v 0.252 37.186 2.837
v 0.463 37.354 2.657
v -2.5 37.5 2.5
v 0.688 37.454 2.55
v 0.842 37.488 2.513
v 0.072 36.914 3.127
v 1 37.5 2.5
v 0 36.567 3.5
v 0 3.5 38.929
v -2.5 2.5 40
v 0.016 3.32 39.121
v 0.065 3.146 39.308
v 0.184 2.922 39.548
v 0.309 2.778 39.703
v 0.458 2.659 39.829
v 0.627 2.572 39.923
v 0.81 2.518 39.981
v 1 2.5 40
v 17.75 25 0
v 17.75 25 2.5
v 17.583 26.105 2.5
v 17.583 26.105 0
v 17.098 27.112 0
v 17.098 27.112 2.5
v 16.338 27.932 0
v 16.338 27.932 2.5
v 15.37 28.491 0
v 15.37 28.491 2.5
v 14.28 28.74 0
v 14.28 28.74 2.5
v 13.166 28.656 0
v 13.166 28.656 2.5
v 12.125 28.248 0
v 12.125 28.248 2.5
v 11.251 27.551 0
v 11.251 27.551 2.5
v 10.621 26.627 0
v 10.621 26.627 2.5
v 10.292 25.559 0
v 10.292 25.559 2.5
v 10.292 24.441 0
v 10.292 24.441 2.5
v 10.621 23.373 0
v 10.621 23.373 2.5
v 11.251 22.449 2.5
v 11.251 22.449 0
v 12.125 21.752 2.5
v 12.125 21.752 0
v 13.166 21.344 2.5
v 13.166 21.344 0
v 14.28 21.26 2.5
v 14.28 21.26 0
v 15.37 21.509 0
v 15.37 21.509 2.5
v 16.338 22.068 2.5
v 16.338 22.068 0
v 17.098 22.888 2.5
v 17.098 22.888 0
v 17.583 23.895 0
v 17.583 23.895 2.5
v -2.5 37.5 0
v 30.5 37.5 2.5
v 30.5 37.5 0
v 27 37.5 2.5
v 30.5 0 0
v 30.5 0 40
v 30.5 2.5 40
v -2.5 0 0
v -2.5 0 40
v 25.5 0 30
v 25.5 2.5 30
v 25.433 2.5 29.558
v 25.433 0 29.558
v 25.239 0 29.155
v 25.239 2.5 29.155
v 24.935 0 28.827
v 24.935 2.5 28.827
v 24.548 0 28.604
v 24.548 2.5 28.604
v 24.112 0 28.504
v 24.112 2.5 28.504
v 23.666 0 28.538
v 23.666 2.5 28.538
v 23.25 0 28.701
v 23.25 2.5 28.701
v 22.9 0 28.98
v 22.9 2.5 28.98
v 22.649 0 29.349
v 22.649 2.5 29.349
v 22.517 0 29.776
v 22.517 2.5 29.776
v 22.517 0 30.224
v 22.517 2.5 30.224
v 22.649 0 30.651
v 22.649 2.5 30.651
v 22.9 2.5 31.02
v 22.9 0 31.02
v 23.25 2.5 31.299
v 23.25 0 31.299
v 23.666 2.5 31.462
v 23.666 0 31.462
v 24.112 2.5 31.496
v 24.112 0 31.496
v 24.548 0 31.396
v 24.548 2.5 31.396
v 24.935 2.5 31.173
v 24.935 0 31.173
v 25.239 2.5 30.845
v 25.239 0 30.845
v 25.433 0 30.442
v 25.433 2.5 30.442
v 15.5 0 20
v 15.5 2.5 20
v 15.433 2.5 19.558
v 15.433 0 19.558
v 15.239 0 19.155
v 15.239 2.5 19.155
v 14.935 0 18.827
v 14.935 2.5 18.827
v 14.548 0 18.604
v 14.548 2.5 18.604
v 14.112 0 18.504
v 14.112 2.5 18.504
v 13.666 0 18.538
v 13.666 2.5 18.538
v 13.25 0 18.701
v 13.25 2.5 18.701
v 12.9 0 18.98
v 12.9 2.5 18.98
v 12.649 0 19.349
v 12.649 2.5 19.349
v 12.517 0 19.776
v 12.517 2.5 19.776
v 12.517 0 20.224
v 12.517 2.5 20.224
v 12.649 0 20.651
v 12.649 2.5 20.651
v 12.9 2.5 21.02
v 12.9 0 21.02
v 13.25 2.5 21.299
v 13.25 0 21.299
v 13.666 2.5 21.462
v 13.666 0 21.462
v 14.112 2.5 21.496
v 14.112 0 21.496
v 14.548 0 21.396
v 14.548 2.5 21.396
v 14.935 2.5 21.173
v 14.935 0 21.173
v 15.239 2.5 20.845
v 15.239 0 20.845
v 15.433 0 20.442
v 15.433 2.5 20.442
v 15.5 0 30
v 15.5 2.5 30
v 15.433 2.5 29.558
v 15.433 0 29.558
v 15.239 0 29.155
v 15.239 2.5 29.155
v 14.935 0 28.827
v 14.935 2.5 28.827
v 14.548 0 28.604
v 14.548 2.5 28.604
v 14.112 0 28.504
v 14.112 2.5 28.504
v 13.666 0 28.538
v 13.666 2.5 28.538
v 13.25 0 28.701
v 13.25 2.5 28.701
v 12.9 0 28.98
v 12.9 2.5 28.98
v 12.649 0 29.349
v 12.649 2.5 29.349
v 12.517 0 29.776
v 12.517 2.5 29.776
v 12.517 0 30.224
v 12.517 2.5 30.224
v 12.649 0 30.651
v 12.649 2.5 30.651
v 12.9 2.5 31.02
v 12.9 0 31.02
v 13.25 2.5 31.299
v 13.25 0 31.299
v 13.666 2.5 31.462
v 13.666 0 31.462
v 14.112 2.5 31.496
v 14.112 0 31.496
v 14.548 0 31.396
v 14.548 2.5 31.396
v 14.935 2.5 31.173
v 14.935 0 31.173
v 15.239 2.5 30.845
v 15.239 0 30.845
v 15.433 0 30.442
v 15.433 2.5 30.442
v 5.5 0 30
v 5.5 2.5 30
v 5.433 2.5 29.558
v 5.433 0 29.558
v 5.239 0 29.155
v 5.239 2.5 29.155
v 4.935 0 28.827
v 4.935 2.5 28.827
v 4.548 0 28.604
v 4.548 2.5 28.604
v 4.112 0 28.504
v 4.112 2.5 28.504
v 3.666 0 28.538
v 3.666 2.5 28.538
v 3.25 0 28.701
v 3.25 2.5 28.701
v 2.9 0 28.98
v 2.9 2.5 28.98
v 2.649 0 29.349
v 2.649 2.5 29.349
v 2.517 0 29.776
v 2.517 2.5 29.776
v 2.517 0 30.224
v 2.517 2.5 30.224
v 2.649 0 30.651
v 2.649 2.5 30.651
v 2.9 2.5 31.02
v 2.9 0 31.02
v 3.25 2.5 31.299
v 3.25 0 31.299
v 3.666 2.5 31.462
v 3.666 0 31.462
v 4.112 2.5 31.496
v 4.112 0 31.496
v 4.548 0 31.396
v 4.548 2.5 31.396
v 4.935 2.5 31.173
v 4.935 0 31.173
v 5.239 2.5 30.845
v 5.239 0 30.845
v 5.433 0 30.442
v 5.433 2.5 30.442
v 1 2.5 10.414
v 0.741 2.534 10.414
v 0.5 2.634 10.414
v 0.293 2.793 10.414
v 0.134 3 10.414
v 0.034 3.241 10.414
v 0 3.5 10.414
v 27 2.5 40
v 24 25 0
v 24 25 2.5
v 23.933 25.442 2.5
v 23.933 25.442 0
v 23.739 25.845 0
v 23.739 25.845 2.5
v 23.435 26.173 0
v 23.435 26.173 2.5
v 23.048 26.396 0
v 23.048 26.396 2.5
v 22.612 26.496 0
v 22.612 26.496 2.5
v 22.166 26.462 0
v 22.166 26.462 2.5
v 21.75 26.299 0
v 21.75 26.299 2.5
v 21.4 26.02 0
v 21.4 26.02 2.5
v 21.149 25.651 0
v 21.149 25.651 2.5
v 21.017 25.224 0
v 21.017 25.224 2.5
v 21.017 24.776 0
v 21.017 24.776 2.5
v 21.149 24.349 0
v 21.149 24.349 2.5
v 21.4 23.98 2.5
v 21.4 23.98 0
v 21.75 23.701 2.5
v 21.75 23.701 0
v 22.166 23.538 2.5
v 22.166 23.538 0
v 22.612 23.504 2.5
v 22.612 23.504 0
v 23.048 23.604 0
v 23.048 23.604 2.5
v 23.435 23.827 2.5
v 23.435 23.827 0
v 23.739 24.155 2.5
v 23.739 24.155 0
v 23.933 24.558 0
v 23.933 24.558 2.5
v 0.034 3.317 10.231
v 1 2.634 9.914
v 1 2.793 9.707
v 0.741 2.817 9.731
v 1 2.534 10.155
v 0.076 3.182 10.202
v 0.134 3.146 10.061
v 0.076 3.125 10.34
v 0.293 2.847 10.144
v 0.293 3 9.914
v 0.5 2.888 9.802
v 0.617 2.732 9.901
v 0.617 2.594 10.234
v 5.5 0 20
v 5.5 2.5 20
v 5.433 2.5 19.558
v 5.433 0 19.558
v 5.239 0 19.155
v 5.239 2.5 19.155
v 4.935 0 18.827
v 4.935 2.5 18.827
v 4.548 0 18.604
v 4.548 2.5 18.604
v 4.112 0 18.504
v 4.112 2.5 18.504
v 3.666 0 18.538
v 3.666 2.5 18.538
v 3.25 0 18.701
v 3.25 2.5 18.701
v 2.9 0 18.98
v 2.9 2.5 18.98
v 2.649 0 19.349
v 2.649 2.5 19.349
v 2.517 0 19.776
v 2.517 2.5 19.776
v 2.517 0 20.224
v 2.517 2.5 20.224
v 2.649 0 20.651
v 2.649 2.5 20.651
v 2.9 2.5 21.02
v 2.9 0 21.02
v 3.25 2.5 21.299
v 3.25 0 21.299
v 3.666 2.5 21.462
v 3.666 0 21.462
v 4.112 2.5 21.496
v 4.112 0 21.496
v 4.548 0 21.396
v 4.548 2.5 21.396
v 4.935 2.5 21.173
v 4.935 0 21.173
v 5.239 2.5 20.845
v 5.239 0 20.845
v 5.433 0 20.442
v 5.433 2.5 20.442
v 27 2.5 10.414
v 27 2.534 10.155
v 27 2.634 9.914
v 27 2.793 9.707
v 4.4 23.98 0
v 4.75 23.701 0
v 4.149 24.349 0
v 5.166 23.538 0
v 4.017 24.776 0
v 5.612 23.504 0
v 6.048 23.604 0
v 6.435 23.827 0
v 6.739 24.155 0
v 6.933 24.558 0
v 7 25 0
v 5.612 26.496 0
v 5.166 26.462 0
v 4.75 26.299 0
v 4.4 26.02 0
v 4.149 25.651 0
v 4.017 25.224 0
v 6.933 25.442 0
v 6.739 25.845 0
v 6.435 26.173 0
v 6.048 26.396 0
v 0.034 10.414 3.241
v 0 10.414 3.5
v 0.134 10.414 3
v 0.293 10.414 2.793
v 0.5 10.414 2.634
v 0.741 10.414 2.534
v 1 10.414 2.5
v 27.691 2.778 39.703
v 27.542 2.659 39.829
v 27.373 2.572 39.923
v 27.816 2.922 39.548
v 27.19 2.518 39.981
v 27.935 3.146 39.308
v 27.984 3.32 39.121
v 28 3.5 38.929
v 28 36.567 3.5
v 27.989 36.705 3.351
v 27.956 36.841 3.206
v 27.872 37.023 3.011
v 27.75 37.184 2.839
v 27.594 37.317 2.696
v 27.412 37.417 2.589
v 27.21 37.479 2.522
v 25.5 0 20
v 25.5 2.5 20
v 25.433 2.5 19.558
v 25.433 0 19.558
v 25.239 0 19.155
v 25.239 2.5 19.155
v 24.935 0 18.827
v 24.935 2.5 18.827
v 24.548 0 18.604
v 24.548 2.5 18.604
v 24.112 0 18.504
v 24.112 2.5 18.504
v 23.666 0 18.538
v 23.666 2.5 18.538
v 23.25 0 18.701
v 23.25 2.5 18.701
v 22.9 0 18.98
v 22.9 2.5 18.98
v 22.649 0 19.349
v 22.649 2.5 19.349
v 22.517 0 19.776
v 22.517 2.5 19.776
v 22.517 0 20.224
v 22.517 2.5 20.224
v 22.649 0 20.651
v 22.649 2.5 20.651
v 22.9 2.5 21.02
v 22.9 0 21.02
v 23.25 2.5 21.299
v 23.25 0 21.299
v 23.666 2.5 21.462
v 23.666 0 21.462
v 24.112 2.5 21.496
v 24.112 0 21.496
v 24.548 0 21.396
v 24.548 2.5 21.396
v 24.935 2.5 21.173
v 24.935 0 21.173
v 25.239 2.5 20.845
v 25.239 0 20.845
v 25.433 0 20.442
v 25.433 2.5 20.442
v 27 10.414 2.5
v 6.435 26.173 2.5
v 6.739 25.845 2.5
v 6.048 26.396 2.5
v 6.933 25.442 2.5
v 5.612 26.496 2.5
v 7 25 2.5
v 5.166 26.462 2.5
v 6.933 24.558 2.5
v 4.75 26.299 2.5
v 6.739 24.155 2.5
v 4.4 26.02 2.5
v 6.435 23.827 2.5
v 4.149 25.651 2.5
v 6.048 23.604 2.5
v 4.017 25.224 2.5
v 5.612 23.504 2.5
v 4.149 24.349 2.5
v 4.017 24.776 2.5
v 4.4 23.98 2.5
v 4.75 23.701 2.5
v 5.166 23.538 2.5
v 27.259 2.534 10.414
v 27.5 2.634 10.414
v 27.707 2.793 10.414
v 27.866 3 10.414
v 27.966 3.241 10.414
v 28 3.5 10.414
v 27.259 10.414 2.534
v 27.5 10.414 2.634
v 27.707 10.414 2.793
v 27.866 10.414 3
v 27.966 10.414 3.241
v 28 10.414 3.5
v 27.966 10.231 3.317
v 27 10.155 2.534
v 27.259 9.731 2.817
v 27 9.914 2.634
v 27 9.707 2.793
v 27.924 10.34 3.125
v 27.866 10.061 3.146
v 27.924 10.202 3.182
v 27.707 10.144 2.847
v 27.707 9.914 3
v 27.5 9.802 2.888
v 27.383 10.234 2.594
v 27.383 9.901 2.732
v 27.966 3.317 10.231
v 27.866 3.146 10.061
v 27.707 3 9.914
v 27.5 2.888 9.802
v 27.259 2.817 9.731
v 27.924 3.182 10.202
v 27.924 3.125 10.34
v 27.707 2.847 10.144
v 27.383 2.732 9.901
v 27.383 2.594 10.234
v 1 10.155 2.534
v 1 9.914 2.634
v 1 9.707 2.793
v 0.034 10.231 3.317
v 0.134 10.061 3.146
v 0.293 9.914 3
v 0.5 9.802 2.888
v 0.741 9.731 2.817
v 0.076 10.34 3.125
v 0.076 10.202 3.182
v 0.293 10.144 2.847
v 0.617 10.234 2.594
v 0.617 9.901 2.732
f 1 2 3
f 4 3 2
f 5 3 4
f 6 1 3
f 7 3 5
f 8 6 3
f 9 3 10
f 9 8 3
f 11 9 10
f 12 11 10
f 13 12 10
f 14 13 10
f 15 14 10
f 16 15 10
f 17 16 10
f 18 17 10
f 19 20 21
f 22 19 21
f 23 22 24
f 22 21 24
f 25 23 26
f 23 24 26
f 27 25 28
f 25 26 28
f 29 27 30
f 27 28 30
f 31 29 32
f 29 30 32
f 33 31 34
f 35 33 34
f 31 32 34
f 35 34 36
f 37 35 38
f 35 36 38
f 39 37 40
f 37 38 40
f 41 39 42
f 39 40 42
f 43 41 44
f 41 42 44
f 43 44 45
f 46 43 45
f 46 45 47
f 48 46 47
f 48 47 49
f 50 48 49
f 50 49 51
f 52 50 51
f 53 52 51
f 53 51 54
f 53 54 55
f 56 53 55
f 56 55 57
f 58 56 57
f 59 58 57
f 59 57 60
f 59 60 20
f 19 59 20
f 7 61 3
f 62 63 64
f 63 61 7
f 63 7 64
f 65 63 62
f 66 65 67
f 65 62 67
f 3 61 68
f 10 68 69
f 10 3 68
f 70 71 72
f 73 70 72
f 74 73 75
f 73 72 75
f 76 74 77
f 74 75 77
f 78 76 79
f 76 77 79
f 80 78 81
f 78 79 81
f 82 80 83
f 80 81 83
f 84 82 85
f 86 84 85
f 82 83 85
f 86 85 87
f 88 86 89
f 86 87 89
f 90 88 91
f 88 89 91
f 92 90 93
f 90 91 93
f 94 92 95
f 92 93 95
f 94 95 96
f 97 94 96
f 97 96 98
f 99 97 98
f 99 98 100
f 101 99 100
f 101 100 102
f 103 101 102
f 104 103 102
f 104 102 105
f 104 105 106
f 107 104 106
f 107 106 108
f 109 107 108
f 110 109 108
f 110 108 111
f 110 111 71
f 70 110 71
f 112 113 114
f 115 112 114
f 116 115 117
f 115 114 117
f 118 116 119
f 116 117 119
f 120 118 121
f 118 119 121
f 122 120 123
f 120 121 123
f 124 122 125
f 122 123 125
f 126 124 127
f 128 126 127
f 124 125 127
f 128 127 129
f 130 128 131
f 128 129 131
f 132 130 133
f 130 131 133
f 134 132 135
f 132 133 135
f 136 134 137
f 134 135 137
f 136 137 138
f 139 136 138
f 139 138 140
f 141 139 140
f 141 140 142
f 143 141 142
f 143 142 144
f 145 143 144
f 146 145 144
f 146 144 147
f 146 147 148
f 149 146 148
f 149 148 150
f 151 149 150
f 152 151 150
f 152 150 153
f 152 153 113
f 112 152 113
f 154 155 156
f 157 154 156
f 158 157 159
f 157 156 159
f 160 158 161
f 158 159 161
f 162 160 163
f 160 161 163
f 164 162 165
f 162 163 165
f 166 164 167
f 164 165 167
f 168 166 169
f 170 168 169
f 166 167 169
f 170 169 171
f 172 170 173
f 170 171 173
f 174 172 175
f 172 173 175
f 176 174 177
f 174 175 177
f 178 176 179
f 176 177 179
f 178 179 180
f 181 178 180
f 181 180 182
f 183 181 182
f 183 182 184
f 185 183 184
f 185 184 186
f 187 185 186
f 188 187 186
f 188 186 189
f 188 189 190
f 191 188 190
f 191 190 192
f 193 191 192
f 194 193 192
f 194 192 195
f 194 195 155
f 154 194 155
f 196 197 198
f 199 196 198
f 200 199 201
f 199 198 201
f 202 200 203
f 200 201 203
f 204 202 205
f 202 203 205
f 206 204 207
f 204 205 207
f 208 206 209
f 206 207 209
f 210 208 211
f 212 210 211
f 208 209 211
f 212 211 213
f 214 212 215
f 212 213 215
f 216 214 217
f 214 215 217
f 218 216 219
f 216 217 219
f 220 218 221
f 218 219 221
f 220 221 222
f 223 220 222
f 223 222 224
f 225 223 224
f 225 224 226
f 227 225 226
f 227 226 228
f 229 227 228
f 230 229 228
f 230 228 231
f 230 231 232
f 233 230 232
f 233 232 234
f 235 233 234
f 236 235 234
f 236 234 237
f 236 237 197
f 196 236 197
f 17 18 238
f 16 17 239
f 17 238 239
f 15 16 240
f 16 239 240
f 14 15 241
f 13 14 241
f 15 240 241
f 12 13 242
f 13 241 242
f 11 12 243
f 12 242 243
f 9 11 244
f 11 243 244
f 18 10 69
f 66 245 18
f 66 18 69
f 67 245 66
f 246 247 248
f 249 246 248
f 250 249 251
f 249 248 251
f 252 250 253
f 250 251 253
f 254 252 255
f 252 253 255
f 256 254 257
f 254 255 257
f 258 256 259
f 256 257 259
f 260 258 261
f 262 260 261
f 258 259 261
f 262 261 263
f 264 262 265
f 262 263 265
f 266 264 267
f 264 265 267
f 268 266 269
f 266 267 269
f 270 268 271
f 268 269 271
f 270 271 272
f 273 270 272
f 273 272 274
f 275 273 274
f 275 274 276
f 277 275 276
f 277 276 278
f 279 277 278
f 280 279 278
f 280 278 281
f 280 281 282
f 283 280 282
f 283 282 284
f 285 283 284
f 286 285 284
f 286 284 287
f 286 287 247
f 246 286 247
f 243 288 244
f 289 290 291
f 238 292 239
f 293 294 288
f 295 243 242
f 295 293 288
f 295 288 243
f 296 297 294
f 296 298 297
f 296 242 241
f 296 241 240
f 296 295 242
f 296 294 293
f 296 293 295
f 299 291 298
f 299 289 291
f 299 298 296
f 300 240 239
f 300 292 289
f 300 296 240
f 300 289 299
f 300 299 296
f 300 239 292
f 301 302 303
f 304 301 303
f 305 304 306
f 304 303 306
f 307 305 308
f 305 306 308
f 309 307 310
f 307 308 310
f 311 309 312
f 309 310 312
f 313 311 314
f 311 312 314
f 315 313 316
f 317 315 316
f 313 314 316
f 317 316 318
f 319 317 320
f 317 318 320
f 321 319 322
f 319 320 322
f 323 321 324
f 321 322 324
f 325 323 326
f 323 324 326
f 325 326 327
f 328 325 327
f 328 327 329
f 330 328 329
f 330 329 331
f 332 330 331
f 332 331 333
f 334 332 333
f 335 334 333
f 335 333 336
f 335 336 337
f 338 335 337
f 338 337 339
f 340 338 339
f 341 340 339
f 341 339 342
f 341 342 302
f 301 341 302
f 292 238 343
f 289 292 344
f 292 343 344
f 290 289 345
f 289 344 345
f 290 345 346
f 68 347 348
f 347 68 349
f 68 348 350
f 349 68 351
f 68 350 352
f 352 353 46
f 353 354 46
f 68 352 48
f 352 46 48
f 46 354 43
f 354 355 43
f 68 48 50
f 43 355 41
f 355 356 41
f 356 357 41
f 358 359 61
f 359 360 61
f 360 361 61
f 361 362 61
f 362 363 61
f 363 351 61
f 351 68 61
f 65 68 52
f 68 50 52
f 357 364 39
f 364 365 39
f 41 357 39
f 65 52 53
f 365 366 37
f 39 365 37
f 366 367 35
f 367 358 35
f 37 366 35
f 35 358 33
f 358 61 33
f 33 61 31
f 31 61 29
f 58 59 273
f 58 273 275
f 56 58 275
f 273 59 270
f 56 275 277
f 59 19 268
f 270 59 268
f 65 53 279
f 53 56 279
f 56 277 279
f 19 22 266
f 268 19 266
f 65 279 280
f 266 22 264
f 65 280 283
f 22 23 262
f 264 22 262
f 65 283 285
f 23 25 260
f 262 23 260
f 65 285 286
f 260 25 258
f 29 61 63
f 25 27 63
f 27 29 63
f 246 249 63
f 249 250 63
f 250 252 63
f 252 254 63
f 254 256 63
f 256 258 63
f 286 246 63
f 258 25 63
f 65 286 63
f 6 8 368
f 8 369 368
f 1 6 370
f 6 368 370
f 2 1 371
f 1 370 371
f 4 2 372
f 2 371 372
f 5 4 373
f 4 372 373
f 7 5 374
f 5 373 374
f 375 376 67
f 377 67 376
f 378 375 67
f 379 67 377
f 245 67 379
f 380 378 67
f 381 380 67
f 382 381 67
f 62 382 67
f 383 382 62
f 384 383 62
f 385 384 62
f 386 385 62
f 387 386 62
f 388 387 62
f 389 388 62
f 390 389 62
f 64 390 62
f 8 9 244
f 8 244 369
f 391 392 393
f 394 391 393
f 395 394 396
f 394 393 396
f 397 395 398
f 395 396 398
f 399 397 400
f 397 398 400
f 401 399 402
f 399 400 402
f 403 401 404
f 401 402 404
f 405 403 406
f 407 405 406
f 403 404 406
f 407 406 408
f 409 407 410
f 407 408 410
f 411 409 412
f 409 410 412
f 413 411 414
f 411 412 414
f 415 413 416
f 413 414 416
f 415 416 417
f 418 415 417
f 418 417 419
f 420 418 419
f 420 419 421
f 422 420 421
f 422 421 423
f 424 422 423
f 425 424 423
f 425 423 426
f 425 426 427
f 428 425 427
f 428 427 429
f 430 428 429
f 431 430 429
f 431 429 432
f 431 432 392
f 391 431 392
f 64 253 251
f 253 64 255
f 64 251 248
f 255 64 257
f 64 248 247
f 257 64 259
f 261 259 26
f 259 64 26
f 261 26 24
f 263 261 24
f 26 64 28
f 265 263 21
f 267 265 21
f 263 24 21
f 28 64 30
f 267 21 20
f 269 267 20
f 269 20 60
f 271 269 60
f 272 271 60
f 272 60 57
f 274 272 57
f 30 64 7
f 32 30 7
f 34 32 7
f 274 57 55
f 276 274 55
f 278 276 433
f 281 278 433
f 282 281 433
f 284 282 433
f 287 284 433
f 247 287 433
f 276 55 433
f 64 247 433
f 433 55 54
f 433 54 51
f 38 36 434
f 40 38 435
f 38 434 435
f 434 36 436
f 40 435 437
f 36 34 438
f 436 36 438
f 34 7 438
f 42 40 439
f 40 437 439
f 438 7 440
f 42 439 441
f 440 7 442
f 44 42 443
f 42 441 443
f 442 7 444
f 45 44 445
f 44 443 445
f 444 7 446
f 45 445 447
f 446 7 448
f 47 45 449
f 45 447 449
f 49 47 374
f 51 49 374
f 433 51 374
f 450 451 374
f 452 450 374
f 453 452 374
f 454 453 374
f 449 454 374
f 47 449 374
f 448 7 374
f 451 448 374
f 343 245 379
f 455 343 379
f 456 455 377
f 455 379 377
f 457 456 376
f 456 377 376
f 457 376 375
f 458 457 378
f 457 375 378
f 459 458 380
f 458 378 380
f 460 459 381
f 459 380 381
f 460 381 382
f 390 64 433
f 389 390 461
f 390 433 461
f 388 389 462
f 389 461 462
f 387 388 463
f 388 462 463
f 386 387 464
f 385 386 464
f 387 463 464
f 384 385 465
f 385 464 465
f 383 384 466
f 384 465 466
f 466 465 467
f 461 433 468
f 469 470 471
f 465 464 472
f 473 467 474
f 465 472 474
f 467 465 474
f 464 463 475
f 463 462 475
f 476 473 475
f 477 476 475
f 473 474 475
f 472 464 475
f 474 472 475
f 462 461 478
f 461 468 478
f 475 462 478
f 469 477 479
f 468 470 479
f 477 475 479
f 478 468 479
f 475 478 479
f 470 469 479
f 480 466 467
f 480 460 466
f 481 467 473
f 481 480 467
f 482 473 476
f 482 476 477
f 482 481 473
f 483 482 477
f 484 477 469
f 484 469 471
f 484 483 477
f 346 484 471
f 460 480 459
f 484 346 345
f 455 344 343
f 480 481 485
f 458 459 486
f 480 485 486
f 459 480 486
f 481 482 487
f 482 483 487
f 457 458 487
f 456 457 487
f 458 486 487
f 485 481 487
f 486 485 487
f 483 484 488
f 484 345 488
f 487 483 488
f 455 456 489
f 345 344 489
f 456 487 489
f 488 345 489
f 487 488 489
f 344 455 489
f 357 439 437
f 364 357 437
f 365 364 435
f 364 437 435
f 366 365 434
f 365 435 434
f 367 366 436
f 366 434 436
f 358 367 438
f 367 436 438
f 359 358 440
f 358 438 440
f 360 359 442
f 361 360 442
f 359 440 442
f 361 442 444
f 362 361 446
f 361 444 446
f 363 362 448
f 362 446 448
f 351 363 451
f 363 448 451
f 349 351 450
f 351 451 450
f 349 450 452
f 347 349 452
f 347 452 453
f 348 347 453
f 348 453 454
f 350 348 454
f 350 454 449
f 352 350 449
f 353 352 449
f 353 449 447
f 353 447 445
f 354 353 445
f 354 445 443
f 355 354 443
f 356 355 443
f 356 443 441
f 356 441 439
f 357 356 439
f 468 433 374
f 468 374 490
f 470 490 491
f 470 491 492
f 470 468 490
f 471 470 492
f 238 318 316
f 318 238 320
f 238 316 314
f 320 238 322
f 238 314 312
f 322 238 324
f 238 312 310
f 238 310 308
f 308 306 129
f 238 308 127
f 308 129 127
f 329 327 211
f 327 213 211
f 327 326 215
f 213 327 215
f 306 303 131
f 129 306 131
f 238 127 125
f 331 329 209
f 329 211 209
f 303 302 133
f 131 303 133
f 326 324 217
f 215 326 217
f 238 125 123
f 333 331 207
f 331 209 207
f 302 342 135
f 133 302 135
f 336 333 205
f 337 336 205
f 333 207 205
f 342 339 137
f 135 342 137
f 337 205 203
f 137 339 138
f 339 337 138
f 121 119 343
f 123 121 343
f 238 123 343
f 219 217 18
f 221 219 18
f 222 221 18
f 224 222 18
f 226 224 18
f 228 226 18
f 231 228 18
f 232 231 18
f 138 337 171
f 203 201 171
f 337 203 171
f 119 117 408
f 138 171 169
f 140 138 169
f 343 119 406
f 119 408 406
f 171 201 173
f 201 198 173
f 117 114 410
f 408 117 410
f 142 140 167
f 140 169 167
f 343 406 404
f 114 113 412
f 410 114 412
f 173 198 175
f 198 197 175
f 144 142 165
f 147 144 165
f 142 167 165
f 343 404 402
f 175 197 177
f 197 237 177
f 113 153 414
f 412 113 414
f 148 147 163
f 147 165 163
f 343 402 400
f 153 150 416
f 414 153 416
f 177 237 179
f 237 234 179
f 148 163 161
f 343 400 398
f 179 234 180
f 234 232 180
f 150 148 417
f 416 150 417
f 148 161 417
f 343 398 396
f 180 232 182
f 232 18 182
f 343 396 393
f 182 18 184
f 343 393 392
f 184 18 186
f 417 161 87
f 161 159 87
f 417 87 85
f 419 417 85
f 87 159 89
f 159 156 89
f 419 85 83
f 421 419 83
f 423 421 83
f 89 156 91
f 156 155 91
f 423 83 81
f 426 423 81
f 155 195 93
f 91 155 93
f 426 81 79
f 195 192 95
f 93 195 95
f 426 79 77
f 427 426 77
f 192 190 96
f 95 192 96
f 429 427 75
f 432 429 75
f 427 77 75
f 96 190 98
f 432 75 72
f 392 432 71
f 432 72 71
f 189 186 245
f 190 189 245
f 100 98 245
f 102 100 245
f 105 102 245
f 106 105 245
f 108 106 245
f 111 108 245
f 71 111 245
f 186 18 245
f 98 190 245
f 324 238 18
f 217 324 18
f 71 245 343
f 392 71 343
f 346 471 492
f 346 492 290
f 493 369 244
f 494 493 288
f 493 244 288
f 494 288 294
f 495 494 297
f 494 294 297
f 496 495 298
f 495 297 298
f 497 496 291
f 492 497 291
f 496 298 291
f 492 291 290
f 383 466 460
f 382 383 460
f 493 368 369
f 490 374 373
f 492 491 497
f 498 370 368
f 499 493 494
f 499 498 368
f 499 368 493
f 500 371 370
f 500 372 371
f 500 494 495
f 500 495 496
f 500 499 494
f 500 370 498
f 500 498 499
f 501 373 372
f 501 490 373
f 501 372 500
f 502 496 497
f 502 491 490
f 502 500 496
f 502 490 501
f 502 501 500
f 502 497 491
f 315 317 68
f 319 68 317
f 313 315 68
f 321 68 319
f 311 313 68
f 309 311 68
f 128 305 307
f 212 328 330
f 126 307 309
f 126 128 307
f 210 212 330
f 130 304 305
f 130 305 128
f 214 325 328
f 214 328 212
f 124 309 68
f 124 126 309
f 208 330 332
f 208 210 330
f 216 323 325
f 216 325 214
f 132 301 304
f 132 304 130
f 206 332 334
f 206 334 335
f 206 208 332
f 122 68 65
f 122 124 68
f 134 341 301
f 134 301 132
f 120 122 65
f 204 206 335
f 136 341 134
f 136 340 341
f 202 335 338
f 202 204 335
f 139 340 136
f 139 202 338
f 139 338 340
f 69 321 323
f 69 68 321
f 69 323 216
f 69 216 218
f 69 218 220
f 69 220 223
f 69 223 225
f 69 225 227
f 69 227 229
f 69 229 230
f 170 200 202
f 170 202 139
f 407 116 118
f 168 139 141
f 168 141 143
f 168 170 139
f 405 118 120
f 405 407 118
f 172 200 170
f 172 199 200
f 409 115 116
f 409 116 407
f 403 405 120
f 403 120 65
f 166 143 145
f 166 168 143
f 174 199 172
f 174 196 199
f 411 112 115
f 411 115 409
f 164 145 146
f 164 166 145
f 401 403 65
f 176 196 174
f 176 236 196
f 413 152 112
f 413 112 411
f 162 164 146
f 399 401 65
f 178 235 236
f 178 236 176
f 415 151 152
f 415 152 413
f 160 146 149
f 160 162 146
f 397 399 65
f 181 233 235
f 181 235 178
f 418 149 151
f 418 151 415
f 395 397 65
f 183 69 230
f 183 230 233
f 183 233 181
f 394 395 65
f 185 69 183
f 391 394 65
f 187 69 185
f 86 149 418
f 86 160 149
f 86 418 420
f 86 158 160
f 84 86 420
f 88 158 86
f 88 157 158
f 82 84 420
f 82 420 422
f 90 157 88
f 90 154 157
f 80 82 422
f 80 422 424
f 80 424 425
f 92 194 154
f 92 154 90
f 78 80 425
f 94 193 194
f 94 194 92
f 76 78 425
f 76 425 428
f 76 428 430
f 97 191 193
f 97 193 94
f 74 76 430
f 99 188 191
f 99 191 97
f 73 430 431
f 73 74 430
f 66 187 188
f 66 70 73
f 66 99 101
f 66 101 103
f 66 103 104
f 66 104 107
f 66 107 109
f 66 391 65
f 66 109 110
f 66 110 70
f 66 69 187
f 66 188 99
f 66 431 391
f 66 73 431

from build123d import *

# Parameters (mm, degrees)
BOSS_EXTRUDE1_DEPTH            = 28
BOSS_EXTRUDE2_DEPTH            = 2.5
BOSS_EXTRUDE3_DEPTH            = 2.5
SKETCH4_W                      = 33
SKETCH4_H                      = 40
BOSS_EXTRUDE4_DEPTH            = 2.5
F_3_0_3_DIAMETER_HOLE1_D       = 3
F_3_0_3_DIAMETER_HOLE1_DEPTH   = 37.500025
F_7_5_7_5_DIAMETER_HOLE1_D     = 7.5
F_7_5_7_5_DIAMETER_HOLE1_DEPTH = 40
F_3_0_3_DIAMETER_HOLE2_D       = 3
F_3_0_3_DIAMETER_HOLE2_DEPTH   = 40
FILLET1_R                      = 1


with BuildPart() as part:
    # Boss-Extrude1: read off the stored shape, not the designer's step
    # Boss-Extrude1 outline → Boss-Extrude1 (new body)
    with BuildSketch(Plane.YZ):
        Polygon((2.5, 0), (37.5, 0), (37.5, 2.5), (10, 2.5), (2.5, 10), align=None)
    extrude(amount=BOSS_EXTRUDE1_DEPTH)

    # Sketch2 → Boss-Extrude2 (add)
    with BuildSketch(Plane(origin=(28, 0, 0), x_dir=(0, 0, -1), z_dir=(1, 0, 0))):
        Polygon((0, 2.5), (-40, 2.5), (-2.5, 37.5), (0, 37.5), align=None)
    extrude(amount=BOSS_EXTRUDE2_DEPTH)

    # Sketch3 → Boss-Extrude3 (add)
    with BuildSketch(Plane.ZY):
        Polygon((40, 2.5), (0, 2.5), (0, 37.5), (2.5, 37.5), align=None)
    extrude(amount=BOSS_EXTRUDE3_DEPTH)

    # Sketch4 → Boss-Extrude4 (add)
    with BuildSketch(Plane.XZ.offset(-2.5)):
        with Locations((14, 20)):
            Rectangle(SKETCH4_W, SKETCH4_H)
    extrude(amount=BOSS_EXTRUDE4_DEPTH)

    # Ø3.0 (3) Diameter Hole1
    with Locations(Plane(origin=(0, 0, 0), x_dir=(-1, 0, 0), z_dir=(0, -1, 0))):
        with Locations((-4, -30), (-4, -20), (-14, -30), (-14, -20), (-24, -30), (-24, -20)):
            Hole(F_3_0_3_DIAMETER_HOLE1_D / 2, depth=F_3_0_3_DIAMETER_HOLE1_DEPTH)

    # Ø7.5 (7.5) Diameter Hole1
    with Locations(Plane(origin=(0, 0, 0), x_dir=(-1, 0, 0), z_dir=(0, 0, -1))):
        with Locations((-14, 25)):
            Hole(F_7_5_7_5_DIAMETER_HOLE1_D / 2, depth=F_7_5_7_5_DIAMETER_HOLE1_DEPTH)

    # Ø3.0 (3) Diameter Hole2
    with Locations(Plane(origin=(0, 0, 0), x_dir=(-1, 0, 0), z_dir=(0, 0, -1))):
        with Locations((-22.5, 25), (-5.5, 25)):
            Hole(F_3_0_3_DIAMETER_HOLE2_D / 2, depth=F_3_0_3_DIAMETER_HOLE2_DEPTH)

    # Fillet1
    fillet1_edges = [part.edges().sort_by_distance(p)[0] for p in [
        (14, 2.5, 10),
        (0, 6.25, 6.25),
        (28, 6.25, 6.25),
        (14, 10, 2.5),
        (0, 23.75, 2.5),
        (28, 23.75, 2.5),
        (28, 2.5, 25),
        (0, 2.5, 25),
    ]]
    fillet(fillet1_edges, radius=FILLET1_R)


solid = part.part
